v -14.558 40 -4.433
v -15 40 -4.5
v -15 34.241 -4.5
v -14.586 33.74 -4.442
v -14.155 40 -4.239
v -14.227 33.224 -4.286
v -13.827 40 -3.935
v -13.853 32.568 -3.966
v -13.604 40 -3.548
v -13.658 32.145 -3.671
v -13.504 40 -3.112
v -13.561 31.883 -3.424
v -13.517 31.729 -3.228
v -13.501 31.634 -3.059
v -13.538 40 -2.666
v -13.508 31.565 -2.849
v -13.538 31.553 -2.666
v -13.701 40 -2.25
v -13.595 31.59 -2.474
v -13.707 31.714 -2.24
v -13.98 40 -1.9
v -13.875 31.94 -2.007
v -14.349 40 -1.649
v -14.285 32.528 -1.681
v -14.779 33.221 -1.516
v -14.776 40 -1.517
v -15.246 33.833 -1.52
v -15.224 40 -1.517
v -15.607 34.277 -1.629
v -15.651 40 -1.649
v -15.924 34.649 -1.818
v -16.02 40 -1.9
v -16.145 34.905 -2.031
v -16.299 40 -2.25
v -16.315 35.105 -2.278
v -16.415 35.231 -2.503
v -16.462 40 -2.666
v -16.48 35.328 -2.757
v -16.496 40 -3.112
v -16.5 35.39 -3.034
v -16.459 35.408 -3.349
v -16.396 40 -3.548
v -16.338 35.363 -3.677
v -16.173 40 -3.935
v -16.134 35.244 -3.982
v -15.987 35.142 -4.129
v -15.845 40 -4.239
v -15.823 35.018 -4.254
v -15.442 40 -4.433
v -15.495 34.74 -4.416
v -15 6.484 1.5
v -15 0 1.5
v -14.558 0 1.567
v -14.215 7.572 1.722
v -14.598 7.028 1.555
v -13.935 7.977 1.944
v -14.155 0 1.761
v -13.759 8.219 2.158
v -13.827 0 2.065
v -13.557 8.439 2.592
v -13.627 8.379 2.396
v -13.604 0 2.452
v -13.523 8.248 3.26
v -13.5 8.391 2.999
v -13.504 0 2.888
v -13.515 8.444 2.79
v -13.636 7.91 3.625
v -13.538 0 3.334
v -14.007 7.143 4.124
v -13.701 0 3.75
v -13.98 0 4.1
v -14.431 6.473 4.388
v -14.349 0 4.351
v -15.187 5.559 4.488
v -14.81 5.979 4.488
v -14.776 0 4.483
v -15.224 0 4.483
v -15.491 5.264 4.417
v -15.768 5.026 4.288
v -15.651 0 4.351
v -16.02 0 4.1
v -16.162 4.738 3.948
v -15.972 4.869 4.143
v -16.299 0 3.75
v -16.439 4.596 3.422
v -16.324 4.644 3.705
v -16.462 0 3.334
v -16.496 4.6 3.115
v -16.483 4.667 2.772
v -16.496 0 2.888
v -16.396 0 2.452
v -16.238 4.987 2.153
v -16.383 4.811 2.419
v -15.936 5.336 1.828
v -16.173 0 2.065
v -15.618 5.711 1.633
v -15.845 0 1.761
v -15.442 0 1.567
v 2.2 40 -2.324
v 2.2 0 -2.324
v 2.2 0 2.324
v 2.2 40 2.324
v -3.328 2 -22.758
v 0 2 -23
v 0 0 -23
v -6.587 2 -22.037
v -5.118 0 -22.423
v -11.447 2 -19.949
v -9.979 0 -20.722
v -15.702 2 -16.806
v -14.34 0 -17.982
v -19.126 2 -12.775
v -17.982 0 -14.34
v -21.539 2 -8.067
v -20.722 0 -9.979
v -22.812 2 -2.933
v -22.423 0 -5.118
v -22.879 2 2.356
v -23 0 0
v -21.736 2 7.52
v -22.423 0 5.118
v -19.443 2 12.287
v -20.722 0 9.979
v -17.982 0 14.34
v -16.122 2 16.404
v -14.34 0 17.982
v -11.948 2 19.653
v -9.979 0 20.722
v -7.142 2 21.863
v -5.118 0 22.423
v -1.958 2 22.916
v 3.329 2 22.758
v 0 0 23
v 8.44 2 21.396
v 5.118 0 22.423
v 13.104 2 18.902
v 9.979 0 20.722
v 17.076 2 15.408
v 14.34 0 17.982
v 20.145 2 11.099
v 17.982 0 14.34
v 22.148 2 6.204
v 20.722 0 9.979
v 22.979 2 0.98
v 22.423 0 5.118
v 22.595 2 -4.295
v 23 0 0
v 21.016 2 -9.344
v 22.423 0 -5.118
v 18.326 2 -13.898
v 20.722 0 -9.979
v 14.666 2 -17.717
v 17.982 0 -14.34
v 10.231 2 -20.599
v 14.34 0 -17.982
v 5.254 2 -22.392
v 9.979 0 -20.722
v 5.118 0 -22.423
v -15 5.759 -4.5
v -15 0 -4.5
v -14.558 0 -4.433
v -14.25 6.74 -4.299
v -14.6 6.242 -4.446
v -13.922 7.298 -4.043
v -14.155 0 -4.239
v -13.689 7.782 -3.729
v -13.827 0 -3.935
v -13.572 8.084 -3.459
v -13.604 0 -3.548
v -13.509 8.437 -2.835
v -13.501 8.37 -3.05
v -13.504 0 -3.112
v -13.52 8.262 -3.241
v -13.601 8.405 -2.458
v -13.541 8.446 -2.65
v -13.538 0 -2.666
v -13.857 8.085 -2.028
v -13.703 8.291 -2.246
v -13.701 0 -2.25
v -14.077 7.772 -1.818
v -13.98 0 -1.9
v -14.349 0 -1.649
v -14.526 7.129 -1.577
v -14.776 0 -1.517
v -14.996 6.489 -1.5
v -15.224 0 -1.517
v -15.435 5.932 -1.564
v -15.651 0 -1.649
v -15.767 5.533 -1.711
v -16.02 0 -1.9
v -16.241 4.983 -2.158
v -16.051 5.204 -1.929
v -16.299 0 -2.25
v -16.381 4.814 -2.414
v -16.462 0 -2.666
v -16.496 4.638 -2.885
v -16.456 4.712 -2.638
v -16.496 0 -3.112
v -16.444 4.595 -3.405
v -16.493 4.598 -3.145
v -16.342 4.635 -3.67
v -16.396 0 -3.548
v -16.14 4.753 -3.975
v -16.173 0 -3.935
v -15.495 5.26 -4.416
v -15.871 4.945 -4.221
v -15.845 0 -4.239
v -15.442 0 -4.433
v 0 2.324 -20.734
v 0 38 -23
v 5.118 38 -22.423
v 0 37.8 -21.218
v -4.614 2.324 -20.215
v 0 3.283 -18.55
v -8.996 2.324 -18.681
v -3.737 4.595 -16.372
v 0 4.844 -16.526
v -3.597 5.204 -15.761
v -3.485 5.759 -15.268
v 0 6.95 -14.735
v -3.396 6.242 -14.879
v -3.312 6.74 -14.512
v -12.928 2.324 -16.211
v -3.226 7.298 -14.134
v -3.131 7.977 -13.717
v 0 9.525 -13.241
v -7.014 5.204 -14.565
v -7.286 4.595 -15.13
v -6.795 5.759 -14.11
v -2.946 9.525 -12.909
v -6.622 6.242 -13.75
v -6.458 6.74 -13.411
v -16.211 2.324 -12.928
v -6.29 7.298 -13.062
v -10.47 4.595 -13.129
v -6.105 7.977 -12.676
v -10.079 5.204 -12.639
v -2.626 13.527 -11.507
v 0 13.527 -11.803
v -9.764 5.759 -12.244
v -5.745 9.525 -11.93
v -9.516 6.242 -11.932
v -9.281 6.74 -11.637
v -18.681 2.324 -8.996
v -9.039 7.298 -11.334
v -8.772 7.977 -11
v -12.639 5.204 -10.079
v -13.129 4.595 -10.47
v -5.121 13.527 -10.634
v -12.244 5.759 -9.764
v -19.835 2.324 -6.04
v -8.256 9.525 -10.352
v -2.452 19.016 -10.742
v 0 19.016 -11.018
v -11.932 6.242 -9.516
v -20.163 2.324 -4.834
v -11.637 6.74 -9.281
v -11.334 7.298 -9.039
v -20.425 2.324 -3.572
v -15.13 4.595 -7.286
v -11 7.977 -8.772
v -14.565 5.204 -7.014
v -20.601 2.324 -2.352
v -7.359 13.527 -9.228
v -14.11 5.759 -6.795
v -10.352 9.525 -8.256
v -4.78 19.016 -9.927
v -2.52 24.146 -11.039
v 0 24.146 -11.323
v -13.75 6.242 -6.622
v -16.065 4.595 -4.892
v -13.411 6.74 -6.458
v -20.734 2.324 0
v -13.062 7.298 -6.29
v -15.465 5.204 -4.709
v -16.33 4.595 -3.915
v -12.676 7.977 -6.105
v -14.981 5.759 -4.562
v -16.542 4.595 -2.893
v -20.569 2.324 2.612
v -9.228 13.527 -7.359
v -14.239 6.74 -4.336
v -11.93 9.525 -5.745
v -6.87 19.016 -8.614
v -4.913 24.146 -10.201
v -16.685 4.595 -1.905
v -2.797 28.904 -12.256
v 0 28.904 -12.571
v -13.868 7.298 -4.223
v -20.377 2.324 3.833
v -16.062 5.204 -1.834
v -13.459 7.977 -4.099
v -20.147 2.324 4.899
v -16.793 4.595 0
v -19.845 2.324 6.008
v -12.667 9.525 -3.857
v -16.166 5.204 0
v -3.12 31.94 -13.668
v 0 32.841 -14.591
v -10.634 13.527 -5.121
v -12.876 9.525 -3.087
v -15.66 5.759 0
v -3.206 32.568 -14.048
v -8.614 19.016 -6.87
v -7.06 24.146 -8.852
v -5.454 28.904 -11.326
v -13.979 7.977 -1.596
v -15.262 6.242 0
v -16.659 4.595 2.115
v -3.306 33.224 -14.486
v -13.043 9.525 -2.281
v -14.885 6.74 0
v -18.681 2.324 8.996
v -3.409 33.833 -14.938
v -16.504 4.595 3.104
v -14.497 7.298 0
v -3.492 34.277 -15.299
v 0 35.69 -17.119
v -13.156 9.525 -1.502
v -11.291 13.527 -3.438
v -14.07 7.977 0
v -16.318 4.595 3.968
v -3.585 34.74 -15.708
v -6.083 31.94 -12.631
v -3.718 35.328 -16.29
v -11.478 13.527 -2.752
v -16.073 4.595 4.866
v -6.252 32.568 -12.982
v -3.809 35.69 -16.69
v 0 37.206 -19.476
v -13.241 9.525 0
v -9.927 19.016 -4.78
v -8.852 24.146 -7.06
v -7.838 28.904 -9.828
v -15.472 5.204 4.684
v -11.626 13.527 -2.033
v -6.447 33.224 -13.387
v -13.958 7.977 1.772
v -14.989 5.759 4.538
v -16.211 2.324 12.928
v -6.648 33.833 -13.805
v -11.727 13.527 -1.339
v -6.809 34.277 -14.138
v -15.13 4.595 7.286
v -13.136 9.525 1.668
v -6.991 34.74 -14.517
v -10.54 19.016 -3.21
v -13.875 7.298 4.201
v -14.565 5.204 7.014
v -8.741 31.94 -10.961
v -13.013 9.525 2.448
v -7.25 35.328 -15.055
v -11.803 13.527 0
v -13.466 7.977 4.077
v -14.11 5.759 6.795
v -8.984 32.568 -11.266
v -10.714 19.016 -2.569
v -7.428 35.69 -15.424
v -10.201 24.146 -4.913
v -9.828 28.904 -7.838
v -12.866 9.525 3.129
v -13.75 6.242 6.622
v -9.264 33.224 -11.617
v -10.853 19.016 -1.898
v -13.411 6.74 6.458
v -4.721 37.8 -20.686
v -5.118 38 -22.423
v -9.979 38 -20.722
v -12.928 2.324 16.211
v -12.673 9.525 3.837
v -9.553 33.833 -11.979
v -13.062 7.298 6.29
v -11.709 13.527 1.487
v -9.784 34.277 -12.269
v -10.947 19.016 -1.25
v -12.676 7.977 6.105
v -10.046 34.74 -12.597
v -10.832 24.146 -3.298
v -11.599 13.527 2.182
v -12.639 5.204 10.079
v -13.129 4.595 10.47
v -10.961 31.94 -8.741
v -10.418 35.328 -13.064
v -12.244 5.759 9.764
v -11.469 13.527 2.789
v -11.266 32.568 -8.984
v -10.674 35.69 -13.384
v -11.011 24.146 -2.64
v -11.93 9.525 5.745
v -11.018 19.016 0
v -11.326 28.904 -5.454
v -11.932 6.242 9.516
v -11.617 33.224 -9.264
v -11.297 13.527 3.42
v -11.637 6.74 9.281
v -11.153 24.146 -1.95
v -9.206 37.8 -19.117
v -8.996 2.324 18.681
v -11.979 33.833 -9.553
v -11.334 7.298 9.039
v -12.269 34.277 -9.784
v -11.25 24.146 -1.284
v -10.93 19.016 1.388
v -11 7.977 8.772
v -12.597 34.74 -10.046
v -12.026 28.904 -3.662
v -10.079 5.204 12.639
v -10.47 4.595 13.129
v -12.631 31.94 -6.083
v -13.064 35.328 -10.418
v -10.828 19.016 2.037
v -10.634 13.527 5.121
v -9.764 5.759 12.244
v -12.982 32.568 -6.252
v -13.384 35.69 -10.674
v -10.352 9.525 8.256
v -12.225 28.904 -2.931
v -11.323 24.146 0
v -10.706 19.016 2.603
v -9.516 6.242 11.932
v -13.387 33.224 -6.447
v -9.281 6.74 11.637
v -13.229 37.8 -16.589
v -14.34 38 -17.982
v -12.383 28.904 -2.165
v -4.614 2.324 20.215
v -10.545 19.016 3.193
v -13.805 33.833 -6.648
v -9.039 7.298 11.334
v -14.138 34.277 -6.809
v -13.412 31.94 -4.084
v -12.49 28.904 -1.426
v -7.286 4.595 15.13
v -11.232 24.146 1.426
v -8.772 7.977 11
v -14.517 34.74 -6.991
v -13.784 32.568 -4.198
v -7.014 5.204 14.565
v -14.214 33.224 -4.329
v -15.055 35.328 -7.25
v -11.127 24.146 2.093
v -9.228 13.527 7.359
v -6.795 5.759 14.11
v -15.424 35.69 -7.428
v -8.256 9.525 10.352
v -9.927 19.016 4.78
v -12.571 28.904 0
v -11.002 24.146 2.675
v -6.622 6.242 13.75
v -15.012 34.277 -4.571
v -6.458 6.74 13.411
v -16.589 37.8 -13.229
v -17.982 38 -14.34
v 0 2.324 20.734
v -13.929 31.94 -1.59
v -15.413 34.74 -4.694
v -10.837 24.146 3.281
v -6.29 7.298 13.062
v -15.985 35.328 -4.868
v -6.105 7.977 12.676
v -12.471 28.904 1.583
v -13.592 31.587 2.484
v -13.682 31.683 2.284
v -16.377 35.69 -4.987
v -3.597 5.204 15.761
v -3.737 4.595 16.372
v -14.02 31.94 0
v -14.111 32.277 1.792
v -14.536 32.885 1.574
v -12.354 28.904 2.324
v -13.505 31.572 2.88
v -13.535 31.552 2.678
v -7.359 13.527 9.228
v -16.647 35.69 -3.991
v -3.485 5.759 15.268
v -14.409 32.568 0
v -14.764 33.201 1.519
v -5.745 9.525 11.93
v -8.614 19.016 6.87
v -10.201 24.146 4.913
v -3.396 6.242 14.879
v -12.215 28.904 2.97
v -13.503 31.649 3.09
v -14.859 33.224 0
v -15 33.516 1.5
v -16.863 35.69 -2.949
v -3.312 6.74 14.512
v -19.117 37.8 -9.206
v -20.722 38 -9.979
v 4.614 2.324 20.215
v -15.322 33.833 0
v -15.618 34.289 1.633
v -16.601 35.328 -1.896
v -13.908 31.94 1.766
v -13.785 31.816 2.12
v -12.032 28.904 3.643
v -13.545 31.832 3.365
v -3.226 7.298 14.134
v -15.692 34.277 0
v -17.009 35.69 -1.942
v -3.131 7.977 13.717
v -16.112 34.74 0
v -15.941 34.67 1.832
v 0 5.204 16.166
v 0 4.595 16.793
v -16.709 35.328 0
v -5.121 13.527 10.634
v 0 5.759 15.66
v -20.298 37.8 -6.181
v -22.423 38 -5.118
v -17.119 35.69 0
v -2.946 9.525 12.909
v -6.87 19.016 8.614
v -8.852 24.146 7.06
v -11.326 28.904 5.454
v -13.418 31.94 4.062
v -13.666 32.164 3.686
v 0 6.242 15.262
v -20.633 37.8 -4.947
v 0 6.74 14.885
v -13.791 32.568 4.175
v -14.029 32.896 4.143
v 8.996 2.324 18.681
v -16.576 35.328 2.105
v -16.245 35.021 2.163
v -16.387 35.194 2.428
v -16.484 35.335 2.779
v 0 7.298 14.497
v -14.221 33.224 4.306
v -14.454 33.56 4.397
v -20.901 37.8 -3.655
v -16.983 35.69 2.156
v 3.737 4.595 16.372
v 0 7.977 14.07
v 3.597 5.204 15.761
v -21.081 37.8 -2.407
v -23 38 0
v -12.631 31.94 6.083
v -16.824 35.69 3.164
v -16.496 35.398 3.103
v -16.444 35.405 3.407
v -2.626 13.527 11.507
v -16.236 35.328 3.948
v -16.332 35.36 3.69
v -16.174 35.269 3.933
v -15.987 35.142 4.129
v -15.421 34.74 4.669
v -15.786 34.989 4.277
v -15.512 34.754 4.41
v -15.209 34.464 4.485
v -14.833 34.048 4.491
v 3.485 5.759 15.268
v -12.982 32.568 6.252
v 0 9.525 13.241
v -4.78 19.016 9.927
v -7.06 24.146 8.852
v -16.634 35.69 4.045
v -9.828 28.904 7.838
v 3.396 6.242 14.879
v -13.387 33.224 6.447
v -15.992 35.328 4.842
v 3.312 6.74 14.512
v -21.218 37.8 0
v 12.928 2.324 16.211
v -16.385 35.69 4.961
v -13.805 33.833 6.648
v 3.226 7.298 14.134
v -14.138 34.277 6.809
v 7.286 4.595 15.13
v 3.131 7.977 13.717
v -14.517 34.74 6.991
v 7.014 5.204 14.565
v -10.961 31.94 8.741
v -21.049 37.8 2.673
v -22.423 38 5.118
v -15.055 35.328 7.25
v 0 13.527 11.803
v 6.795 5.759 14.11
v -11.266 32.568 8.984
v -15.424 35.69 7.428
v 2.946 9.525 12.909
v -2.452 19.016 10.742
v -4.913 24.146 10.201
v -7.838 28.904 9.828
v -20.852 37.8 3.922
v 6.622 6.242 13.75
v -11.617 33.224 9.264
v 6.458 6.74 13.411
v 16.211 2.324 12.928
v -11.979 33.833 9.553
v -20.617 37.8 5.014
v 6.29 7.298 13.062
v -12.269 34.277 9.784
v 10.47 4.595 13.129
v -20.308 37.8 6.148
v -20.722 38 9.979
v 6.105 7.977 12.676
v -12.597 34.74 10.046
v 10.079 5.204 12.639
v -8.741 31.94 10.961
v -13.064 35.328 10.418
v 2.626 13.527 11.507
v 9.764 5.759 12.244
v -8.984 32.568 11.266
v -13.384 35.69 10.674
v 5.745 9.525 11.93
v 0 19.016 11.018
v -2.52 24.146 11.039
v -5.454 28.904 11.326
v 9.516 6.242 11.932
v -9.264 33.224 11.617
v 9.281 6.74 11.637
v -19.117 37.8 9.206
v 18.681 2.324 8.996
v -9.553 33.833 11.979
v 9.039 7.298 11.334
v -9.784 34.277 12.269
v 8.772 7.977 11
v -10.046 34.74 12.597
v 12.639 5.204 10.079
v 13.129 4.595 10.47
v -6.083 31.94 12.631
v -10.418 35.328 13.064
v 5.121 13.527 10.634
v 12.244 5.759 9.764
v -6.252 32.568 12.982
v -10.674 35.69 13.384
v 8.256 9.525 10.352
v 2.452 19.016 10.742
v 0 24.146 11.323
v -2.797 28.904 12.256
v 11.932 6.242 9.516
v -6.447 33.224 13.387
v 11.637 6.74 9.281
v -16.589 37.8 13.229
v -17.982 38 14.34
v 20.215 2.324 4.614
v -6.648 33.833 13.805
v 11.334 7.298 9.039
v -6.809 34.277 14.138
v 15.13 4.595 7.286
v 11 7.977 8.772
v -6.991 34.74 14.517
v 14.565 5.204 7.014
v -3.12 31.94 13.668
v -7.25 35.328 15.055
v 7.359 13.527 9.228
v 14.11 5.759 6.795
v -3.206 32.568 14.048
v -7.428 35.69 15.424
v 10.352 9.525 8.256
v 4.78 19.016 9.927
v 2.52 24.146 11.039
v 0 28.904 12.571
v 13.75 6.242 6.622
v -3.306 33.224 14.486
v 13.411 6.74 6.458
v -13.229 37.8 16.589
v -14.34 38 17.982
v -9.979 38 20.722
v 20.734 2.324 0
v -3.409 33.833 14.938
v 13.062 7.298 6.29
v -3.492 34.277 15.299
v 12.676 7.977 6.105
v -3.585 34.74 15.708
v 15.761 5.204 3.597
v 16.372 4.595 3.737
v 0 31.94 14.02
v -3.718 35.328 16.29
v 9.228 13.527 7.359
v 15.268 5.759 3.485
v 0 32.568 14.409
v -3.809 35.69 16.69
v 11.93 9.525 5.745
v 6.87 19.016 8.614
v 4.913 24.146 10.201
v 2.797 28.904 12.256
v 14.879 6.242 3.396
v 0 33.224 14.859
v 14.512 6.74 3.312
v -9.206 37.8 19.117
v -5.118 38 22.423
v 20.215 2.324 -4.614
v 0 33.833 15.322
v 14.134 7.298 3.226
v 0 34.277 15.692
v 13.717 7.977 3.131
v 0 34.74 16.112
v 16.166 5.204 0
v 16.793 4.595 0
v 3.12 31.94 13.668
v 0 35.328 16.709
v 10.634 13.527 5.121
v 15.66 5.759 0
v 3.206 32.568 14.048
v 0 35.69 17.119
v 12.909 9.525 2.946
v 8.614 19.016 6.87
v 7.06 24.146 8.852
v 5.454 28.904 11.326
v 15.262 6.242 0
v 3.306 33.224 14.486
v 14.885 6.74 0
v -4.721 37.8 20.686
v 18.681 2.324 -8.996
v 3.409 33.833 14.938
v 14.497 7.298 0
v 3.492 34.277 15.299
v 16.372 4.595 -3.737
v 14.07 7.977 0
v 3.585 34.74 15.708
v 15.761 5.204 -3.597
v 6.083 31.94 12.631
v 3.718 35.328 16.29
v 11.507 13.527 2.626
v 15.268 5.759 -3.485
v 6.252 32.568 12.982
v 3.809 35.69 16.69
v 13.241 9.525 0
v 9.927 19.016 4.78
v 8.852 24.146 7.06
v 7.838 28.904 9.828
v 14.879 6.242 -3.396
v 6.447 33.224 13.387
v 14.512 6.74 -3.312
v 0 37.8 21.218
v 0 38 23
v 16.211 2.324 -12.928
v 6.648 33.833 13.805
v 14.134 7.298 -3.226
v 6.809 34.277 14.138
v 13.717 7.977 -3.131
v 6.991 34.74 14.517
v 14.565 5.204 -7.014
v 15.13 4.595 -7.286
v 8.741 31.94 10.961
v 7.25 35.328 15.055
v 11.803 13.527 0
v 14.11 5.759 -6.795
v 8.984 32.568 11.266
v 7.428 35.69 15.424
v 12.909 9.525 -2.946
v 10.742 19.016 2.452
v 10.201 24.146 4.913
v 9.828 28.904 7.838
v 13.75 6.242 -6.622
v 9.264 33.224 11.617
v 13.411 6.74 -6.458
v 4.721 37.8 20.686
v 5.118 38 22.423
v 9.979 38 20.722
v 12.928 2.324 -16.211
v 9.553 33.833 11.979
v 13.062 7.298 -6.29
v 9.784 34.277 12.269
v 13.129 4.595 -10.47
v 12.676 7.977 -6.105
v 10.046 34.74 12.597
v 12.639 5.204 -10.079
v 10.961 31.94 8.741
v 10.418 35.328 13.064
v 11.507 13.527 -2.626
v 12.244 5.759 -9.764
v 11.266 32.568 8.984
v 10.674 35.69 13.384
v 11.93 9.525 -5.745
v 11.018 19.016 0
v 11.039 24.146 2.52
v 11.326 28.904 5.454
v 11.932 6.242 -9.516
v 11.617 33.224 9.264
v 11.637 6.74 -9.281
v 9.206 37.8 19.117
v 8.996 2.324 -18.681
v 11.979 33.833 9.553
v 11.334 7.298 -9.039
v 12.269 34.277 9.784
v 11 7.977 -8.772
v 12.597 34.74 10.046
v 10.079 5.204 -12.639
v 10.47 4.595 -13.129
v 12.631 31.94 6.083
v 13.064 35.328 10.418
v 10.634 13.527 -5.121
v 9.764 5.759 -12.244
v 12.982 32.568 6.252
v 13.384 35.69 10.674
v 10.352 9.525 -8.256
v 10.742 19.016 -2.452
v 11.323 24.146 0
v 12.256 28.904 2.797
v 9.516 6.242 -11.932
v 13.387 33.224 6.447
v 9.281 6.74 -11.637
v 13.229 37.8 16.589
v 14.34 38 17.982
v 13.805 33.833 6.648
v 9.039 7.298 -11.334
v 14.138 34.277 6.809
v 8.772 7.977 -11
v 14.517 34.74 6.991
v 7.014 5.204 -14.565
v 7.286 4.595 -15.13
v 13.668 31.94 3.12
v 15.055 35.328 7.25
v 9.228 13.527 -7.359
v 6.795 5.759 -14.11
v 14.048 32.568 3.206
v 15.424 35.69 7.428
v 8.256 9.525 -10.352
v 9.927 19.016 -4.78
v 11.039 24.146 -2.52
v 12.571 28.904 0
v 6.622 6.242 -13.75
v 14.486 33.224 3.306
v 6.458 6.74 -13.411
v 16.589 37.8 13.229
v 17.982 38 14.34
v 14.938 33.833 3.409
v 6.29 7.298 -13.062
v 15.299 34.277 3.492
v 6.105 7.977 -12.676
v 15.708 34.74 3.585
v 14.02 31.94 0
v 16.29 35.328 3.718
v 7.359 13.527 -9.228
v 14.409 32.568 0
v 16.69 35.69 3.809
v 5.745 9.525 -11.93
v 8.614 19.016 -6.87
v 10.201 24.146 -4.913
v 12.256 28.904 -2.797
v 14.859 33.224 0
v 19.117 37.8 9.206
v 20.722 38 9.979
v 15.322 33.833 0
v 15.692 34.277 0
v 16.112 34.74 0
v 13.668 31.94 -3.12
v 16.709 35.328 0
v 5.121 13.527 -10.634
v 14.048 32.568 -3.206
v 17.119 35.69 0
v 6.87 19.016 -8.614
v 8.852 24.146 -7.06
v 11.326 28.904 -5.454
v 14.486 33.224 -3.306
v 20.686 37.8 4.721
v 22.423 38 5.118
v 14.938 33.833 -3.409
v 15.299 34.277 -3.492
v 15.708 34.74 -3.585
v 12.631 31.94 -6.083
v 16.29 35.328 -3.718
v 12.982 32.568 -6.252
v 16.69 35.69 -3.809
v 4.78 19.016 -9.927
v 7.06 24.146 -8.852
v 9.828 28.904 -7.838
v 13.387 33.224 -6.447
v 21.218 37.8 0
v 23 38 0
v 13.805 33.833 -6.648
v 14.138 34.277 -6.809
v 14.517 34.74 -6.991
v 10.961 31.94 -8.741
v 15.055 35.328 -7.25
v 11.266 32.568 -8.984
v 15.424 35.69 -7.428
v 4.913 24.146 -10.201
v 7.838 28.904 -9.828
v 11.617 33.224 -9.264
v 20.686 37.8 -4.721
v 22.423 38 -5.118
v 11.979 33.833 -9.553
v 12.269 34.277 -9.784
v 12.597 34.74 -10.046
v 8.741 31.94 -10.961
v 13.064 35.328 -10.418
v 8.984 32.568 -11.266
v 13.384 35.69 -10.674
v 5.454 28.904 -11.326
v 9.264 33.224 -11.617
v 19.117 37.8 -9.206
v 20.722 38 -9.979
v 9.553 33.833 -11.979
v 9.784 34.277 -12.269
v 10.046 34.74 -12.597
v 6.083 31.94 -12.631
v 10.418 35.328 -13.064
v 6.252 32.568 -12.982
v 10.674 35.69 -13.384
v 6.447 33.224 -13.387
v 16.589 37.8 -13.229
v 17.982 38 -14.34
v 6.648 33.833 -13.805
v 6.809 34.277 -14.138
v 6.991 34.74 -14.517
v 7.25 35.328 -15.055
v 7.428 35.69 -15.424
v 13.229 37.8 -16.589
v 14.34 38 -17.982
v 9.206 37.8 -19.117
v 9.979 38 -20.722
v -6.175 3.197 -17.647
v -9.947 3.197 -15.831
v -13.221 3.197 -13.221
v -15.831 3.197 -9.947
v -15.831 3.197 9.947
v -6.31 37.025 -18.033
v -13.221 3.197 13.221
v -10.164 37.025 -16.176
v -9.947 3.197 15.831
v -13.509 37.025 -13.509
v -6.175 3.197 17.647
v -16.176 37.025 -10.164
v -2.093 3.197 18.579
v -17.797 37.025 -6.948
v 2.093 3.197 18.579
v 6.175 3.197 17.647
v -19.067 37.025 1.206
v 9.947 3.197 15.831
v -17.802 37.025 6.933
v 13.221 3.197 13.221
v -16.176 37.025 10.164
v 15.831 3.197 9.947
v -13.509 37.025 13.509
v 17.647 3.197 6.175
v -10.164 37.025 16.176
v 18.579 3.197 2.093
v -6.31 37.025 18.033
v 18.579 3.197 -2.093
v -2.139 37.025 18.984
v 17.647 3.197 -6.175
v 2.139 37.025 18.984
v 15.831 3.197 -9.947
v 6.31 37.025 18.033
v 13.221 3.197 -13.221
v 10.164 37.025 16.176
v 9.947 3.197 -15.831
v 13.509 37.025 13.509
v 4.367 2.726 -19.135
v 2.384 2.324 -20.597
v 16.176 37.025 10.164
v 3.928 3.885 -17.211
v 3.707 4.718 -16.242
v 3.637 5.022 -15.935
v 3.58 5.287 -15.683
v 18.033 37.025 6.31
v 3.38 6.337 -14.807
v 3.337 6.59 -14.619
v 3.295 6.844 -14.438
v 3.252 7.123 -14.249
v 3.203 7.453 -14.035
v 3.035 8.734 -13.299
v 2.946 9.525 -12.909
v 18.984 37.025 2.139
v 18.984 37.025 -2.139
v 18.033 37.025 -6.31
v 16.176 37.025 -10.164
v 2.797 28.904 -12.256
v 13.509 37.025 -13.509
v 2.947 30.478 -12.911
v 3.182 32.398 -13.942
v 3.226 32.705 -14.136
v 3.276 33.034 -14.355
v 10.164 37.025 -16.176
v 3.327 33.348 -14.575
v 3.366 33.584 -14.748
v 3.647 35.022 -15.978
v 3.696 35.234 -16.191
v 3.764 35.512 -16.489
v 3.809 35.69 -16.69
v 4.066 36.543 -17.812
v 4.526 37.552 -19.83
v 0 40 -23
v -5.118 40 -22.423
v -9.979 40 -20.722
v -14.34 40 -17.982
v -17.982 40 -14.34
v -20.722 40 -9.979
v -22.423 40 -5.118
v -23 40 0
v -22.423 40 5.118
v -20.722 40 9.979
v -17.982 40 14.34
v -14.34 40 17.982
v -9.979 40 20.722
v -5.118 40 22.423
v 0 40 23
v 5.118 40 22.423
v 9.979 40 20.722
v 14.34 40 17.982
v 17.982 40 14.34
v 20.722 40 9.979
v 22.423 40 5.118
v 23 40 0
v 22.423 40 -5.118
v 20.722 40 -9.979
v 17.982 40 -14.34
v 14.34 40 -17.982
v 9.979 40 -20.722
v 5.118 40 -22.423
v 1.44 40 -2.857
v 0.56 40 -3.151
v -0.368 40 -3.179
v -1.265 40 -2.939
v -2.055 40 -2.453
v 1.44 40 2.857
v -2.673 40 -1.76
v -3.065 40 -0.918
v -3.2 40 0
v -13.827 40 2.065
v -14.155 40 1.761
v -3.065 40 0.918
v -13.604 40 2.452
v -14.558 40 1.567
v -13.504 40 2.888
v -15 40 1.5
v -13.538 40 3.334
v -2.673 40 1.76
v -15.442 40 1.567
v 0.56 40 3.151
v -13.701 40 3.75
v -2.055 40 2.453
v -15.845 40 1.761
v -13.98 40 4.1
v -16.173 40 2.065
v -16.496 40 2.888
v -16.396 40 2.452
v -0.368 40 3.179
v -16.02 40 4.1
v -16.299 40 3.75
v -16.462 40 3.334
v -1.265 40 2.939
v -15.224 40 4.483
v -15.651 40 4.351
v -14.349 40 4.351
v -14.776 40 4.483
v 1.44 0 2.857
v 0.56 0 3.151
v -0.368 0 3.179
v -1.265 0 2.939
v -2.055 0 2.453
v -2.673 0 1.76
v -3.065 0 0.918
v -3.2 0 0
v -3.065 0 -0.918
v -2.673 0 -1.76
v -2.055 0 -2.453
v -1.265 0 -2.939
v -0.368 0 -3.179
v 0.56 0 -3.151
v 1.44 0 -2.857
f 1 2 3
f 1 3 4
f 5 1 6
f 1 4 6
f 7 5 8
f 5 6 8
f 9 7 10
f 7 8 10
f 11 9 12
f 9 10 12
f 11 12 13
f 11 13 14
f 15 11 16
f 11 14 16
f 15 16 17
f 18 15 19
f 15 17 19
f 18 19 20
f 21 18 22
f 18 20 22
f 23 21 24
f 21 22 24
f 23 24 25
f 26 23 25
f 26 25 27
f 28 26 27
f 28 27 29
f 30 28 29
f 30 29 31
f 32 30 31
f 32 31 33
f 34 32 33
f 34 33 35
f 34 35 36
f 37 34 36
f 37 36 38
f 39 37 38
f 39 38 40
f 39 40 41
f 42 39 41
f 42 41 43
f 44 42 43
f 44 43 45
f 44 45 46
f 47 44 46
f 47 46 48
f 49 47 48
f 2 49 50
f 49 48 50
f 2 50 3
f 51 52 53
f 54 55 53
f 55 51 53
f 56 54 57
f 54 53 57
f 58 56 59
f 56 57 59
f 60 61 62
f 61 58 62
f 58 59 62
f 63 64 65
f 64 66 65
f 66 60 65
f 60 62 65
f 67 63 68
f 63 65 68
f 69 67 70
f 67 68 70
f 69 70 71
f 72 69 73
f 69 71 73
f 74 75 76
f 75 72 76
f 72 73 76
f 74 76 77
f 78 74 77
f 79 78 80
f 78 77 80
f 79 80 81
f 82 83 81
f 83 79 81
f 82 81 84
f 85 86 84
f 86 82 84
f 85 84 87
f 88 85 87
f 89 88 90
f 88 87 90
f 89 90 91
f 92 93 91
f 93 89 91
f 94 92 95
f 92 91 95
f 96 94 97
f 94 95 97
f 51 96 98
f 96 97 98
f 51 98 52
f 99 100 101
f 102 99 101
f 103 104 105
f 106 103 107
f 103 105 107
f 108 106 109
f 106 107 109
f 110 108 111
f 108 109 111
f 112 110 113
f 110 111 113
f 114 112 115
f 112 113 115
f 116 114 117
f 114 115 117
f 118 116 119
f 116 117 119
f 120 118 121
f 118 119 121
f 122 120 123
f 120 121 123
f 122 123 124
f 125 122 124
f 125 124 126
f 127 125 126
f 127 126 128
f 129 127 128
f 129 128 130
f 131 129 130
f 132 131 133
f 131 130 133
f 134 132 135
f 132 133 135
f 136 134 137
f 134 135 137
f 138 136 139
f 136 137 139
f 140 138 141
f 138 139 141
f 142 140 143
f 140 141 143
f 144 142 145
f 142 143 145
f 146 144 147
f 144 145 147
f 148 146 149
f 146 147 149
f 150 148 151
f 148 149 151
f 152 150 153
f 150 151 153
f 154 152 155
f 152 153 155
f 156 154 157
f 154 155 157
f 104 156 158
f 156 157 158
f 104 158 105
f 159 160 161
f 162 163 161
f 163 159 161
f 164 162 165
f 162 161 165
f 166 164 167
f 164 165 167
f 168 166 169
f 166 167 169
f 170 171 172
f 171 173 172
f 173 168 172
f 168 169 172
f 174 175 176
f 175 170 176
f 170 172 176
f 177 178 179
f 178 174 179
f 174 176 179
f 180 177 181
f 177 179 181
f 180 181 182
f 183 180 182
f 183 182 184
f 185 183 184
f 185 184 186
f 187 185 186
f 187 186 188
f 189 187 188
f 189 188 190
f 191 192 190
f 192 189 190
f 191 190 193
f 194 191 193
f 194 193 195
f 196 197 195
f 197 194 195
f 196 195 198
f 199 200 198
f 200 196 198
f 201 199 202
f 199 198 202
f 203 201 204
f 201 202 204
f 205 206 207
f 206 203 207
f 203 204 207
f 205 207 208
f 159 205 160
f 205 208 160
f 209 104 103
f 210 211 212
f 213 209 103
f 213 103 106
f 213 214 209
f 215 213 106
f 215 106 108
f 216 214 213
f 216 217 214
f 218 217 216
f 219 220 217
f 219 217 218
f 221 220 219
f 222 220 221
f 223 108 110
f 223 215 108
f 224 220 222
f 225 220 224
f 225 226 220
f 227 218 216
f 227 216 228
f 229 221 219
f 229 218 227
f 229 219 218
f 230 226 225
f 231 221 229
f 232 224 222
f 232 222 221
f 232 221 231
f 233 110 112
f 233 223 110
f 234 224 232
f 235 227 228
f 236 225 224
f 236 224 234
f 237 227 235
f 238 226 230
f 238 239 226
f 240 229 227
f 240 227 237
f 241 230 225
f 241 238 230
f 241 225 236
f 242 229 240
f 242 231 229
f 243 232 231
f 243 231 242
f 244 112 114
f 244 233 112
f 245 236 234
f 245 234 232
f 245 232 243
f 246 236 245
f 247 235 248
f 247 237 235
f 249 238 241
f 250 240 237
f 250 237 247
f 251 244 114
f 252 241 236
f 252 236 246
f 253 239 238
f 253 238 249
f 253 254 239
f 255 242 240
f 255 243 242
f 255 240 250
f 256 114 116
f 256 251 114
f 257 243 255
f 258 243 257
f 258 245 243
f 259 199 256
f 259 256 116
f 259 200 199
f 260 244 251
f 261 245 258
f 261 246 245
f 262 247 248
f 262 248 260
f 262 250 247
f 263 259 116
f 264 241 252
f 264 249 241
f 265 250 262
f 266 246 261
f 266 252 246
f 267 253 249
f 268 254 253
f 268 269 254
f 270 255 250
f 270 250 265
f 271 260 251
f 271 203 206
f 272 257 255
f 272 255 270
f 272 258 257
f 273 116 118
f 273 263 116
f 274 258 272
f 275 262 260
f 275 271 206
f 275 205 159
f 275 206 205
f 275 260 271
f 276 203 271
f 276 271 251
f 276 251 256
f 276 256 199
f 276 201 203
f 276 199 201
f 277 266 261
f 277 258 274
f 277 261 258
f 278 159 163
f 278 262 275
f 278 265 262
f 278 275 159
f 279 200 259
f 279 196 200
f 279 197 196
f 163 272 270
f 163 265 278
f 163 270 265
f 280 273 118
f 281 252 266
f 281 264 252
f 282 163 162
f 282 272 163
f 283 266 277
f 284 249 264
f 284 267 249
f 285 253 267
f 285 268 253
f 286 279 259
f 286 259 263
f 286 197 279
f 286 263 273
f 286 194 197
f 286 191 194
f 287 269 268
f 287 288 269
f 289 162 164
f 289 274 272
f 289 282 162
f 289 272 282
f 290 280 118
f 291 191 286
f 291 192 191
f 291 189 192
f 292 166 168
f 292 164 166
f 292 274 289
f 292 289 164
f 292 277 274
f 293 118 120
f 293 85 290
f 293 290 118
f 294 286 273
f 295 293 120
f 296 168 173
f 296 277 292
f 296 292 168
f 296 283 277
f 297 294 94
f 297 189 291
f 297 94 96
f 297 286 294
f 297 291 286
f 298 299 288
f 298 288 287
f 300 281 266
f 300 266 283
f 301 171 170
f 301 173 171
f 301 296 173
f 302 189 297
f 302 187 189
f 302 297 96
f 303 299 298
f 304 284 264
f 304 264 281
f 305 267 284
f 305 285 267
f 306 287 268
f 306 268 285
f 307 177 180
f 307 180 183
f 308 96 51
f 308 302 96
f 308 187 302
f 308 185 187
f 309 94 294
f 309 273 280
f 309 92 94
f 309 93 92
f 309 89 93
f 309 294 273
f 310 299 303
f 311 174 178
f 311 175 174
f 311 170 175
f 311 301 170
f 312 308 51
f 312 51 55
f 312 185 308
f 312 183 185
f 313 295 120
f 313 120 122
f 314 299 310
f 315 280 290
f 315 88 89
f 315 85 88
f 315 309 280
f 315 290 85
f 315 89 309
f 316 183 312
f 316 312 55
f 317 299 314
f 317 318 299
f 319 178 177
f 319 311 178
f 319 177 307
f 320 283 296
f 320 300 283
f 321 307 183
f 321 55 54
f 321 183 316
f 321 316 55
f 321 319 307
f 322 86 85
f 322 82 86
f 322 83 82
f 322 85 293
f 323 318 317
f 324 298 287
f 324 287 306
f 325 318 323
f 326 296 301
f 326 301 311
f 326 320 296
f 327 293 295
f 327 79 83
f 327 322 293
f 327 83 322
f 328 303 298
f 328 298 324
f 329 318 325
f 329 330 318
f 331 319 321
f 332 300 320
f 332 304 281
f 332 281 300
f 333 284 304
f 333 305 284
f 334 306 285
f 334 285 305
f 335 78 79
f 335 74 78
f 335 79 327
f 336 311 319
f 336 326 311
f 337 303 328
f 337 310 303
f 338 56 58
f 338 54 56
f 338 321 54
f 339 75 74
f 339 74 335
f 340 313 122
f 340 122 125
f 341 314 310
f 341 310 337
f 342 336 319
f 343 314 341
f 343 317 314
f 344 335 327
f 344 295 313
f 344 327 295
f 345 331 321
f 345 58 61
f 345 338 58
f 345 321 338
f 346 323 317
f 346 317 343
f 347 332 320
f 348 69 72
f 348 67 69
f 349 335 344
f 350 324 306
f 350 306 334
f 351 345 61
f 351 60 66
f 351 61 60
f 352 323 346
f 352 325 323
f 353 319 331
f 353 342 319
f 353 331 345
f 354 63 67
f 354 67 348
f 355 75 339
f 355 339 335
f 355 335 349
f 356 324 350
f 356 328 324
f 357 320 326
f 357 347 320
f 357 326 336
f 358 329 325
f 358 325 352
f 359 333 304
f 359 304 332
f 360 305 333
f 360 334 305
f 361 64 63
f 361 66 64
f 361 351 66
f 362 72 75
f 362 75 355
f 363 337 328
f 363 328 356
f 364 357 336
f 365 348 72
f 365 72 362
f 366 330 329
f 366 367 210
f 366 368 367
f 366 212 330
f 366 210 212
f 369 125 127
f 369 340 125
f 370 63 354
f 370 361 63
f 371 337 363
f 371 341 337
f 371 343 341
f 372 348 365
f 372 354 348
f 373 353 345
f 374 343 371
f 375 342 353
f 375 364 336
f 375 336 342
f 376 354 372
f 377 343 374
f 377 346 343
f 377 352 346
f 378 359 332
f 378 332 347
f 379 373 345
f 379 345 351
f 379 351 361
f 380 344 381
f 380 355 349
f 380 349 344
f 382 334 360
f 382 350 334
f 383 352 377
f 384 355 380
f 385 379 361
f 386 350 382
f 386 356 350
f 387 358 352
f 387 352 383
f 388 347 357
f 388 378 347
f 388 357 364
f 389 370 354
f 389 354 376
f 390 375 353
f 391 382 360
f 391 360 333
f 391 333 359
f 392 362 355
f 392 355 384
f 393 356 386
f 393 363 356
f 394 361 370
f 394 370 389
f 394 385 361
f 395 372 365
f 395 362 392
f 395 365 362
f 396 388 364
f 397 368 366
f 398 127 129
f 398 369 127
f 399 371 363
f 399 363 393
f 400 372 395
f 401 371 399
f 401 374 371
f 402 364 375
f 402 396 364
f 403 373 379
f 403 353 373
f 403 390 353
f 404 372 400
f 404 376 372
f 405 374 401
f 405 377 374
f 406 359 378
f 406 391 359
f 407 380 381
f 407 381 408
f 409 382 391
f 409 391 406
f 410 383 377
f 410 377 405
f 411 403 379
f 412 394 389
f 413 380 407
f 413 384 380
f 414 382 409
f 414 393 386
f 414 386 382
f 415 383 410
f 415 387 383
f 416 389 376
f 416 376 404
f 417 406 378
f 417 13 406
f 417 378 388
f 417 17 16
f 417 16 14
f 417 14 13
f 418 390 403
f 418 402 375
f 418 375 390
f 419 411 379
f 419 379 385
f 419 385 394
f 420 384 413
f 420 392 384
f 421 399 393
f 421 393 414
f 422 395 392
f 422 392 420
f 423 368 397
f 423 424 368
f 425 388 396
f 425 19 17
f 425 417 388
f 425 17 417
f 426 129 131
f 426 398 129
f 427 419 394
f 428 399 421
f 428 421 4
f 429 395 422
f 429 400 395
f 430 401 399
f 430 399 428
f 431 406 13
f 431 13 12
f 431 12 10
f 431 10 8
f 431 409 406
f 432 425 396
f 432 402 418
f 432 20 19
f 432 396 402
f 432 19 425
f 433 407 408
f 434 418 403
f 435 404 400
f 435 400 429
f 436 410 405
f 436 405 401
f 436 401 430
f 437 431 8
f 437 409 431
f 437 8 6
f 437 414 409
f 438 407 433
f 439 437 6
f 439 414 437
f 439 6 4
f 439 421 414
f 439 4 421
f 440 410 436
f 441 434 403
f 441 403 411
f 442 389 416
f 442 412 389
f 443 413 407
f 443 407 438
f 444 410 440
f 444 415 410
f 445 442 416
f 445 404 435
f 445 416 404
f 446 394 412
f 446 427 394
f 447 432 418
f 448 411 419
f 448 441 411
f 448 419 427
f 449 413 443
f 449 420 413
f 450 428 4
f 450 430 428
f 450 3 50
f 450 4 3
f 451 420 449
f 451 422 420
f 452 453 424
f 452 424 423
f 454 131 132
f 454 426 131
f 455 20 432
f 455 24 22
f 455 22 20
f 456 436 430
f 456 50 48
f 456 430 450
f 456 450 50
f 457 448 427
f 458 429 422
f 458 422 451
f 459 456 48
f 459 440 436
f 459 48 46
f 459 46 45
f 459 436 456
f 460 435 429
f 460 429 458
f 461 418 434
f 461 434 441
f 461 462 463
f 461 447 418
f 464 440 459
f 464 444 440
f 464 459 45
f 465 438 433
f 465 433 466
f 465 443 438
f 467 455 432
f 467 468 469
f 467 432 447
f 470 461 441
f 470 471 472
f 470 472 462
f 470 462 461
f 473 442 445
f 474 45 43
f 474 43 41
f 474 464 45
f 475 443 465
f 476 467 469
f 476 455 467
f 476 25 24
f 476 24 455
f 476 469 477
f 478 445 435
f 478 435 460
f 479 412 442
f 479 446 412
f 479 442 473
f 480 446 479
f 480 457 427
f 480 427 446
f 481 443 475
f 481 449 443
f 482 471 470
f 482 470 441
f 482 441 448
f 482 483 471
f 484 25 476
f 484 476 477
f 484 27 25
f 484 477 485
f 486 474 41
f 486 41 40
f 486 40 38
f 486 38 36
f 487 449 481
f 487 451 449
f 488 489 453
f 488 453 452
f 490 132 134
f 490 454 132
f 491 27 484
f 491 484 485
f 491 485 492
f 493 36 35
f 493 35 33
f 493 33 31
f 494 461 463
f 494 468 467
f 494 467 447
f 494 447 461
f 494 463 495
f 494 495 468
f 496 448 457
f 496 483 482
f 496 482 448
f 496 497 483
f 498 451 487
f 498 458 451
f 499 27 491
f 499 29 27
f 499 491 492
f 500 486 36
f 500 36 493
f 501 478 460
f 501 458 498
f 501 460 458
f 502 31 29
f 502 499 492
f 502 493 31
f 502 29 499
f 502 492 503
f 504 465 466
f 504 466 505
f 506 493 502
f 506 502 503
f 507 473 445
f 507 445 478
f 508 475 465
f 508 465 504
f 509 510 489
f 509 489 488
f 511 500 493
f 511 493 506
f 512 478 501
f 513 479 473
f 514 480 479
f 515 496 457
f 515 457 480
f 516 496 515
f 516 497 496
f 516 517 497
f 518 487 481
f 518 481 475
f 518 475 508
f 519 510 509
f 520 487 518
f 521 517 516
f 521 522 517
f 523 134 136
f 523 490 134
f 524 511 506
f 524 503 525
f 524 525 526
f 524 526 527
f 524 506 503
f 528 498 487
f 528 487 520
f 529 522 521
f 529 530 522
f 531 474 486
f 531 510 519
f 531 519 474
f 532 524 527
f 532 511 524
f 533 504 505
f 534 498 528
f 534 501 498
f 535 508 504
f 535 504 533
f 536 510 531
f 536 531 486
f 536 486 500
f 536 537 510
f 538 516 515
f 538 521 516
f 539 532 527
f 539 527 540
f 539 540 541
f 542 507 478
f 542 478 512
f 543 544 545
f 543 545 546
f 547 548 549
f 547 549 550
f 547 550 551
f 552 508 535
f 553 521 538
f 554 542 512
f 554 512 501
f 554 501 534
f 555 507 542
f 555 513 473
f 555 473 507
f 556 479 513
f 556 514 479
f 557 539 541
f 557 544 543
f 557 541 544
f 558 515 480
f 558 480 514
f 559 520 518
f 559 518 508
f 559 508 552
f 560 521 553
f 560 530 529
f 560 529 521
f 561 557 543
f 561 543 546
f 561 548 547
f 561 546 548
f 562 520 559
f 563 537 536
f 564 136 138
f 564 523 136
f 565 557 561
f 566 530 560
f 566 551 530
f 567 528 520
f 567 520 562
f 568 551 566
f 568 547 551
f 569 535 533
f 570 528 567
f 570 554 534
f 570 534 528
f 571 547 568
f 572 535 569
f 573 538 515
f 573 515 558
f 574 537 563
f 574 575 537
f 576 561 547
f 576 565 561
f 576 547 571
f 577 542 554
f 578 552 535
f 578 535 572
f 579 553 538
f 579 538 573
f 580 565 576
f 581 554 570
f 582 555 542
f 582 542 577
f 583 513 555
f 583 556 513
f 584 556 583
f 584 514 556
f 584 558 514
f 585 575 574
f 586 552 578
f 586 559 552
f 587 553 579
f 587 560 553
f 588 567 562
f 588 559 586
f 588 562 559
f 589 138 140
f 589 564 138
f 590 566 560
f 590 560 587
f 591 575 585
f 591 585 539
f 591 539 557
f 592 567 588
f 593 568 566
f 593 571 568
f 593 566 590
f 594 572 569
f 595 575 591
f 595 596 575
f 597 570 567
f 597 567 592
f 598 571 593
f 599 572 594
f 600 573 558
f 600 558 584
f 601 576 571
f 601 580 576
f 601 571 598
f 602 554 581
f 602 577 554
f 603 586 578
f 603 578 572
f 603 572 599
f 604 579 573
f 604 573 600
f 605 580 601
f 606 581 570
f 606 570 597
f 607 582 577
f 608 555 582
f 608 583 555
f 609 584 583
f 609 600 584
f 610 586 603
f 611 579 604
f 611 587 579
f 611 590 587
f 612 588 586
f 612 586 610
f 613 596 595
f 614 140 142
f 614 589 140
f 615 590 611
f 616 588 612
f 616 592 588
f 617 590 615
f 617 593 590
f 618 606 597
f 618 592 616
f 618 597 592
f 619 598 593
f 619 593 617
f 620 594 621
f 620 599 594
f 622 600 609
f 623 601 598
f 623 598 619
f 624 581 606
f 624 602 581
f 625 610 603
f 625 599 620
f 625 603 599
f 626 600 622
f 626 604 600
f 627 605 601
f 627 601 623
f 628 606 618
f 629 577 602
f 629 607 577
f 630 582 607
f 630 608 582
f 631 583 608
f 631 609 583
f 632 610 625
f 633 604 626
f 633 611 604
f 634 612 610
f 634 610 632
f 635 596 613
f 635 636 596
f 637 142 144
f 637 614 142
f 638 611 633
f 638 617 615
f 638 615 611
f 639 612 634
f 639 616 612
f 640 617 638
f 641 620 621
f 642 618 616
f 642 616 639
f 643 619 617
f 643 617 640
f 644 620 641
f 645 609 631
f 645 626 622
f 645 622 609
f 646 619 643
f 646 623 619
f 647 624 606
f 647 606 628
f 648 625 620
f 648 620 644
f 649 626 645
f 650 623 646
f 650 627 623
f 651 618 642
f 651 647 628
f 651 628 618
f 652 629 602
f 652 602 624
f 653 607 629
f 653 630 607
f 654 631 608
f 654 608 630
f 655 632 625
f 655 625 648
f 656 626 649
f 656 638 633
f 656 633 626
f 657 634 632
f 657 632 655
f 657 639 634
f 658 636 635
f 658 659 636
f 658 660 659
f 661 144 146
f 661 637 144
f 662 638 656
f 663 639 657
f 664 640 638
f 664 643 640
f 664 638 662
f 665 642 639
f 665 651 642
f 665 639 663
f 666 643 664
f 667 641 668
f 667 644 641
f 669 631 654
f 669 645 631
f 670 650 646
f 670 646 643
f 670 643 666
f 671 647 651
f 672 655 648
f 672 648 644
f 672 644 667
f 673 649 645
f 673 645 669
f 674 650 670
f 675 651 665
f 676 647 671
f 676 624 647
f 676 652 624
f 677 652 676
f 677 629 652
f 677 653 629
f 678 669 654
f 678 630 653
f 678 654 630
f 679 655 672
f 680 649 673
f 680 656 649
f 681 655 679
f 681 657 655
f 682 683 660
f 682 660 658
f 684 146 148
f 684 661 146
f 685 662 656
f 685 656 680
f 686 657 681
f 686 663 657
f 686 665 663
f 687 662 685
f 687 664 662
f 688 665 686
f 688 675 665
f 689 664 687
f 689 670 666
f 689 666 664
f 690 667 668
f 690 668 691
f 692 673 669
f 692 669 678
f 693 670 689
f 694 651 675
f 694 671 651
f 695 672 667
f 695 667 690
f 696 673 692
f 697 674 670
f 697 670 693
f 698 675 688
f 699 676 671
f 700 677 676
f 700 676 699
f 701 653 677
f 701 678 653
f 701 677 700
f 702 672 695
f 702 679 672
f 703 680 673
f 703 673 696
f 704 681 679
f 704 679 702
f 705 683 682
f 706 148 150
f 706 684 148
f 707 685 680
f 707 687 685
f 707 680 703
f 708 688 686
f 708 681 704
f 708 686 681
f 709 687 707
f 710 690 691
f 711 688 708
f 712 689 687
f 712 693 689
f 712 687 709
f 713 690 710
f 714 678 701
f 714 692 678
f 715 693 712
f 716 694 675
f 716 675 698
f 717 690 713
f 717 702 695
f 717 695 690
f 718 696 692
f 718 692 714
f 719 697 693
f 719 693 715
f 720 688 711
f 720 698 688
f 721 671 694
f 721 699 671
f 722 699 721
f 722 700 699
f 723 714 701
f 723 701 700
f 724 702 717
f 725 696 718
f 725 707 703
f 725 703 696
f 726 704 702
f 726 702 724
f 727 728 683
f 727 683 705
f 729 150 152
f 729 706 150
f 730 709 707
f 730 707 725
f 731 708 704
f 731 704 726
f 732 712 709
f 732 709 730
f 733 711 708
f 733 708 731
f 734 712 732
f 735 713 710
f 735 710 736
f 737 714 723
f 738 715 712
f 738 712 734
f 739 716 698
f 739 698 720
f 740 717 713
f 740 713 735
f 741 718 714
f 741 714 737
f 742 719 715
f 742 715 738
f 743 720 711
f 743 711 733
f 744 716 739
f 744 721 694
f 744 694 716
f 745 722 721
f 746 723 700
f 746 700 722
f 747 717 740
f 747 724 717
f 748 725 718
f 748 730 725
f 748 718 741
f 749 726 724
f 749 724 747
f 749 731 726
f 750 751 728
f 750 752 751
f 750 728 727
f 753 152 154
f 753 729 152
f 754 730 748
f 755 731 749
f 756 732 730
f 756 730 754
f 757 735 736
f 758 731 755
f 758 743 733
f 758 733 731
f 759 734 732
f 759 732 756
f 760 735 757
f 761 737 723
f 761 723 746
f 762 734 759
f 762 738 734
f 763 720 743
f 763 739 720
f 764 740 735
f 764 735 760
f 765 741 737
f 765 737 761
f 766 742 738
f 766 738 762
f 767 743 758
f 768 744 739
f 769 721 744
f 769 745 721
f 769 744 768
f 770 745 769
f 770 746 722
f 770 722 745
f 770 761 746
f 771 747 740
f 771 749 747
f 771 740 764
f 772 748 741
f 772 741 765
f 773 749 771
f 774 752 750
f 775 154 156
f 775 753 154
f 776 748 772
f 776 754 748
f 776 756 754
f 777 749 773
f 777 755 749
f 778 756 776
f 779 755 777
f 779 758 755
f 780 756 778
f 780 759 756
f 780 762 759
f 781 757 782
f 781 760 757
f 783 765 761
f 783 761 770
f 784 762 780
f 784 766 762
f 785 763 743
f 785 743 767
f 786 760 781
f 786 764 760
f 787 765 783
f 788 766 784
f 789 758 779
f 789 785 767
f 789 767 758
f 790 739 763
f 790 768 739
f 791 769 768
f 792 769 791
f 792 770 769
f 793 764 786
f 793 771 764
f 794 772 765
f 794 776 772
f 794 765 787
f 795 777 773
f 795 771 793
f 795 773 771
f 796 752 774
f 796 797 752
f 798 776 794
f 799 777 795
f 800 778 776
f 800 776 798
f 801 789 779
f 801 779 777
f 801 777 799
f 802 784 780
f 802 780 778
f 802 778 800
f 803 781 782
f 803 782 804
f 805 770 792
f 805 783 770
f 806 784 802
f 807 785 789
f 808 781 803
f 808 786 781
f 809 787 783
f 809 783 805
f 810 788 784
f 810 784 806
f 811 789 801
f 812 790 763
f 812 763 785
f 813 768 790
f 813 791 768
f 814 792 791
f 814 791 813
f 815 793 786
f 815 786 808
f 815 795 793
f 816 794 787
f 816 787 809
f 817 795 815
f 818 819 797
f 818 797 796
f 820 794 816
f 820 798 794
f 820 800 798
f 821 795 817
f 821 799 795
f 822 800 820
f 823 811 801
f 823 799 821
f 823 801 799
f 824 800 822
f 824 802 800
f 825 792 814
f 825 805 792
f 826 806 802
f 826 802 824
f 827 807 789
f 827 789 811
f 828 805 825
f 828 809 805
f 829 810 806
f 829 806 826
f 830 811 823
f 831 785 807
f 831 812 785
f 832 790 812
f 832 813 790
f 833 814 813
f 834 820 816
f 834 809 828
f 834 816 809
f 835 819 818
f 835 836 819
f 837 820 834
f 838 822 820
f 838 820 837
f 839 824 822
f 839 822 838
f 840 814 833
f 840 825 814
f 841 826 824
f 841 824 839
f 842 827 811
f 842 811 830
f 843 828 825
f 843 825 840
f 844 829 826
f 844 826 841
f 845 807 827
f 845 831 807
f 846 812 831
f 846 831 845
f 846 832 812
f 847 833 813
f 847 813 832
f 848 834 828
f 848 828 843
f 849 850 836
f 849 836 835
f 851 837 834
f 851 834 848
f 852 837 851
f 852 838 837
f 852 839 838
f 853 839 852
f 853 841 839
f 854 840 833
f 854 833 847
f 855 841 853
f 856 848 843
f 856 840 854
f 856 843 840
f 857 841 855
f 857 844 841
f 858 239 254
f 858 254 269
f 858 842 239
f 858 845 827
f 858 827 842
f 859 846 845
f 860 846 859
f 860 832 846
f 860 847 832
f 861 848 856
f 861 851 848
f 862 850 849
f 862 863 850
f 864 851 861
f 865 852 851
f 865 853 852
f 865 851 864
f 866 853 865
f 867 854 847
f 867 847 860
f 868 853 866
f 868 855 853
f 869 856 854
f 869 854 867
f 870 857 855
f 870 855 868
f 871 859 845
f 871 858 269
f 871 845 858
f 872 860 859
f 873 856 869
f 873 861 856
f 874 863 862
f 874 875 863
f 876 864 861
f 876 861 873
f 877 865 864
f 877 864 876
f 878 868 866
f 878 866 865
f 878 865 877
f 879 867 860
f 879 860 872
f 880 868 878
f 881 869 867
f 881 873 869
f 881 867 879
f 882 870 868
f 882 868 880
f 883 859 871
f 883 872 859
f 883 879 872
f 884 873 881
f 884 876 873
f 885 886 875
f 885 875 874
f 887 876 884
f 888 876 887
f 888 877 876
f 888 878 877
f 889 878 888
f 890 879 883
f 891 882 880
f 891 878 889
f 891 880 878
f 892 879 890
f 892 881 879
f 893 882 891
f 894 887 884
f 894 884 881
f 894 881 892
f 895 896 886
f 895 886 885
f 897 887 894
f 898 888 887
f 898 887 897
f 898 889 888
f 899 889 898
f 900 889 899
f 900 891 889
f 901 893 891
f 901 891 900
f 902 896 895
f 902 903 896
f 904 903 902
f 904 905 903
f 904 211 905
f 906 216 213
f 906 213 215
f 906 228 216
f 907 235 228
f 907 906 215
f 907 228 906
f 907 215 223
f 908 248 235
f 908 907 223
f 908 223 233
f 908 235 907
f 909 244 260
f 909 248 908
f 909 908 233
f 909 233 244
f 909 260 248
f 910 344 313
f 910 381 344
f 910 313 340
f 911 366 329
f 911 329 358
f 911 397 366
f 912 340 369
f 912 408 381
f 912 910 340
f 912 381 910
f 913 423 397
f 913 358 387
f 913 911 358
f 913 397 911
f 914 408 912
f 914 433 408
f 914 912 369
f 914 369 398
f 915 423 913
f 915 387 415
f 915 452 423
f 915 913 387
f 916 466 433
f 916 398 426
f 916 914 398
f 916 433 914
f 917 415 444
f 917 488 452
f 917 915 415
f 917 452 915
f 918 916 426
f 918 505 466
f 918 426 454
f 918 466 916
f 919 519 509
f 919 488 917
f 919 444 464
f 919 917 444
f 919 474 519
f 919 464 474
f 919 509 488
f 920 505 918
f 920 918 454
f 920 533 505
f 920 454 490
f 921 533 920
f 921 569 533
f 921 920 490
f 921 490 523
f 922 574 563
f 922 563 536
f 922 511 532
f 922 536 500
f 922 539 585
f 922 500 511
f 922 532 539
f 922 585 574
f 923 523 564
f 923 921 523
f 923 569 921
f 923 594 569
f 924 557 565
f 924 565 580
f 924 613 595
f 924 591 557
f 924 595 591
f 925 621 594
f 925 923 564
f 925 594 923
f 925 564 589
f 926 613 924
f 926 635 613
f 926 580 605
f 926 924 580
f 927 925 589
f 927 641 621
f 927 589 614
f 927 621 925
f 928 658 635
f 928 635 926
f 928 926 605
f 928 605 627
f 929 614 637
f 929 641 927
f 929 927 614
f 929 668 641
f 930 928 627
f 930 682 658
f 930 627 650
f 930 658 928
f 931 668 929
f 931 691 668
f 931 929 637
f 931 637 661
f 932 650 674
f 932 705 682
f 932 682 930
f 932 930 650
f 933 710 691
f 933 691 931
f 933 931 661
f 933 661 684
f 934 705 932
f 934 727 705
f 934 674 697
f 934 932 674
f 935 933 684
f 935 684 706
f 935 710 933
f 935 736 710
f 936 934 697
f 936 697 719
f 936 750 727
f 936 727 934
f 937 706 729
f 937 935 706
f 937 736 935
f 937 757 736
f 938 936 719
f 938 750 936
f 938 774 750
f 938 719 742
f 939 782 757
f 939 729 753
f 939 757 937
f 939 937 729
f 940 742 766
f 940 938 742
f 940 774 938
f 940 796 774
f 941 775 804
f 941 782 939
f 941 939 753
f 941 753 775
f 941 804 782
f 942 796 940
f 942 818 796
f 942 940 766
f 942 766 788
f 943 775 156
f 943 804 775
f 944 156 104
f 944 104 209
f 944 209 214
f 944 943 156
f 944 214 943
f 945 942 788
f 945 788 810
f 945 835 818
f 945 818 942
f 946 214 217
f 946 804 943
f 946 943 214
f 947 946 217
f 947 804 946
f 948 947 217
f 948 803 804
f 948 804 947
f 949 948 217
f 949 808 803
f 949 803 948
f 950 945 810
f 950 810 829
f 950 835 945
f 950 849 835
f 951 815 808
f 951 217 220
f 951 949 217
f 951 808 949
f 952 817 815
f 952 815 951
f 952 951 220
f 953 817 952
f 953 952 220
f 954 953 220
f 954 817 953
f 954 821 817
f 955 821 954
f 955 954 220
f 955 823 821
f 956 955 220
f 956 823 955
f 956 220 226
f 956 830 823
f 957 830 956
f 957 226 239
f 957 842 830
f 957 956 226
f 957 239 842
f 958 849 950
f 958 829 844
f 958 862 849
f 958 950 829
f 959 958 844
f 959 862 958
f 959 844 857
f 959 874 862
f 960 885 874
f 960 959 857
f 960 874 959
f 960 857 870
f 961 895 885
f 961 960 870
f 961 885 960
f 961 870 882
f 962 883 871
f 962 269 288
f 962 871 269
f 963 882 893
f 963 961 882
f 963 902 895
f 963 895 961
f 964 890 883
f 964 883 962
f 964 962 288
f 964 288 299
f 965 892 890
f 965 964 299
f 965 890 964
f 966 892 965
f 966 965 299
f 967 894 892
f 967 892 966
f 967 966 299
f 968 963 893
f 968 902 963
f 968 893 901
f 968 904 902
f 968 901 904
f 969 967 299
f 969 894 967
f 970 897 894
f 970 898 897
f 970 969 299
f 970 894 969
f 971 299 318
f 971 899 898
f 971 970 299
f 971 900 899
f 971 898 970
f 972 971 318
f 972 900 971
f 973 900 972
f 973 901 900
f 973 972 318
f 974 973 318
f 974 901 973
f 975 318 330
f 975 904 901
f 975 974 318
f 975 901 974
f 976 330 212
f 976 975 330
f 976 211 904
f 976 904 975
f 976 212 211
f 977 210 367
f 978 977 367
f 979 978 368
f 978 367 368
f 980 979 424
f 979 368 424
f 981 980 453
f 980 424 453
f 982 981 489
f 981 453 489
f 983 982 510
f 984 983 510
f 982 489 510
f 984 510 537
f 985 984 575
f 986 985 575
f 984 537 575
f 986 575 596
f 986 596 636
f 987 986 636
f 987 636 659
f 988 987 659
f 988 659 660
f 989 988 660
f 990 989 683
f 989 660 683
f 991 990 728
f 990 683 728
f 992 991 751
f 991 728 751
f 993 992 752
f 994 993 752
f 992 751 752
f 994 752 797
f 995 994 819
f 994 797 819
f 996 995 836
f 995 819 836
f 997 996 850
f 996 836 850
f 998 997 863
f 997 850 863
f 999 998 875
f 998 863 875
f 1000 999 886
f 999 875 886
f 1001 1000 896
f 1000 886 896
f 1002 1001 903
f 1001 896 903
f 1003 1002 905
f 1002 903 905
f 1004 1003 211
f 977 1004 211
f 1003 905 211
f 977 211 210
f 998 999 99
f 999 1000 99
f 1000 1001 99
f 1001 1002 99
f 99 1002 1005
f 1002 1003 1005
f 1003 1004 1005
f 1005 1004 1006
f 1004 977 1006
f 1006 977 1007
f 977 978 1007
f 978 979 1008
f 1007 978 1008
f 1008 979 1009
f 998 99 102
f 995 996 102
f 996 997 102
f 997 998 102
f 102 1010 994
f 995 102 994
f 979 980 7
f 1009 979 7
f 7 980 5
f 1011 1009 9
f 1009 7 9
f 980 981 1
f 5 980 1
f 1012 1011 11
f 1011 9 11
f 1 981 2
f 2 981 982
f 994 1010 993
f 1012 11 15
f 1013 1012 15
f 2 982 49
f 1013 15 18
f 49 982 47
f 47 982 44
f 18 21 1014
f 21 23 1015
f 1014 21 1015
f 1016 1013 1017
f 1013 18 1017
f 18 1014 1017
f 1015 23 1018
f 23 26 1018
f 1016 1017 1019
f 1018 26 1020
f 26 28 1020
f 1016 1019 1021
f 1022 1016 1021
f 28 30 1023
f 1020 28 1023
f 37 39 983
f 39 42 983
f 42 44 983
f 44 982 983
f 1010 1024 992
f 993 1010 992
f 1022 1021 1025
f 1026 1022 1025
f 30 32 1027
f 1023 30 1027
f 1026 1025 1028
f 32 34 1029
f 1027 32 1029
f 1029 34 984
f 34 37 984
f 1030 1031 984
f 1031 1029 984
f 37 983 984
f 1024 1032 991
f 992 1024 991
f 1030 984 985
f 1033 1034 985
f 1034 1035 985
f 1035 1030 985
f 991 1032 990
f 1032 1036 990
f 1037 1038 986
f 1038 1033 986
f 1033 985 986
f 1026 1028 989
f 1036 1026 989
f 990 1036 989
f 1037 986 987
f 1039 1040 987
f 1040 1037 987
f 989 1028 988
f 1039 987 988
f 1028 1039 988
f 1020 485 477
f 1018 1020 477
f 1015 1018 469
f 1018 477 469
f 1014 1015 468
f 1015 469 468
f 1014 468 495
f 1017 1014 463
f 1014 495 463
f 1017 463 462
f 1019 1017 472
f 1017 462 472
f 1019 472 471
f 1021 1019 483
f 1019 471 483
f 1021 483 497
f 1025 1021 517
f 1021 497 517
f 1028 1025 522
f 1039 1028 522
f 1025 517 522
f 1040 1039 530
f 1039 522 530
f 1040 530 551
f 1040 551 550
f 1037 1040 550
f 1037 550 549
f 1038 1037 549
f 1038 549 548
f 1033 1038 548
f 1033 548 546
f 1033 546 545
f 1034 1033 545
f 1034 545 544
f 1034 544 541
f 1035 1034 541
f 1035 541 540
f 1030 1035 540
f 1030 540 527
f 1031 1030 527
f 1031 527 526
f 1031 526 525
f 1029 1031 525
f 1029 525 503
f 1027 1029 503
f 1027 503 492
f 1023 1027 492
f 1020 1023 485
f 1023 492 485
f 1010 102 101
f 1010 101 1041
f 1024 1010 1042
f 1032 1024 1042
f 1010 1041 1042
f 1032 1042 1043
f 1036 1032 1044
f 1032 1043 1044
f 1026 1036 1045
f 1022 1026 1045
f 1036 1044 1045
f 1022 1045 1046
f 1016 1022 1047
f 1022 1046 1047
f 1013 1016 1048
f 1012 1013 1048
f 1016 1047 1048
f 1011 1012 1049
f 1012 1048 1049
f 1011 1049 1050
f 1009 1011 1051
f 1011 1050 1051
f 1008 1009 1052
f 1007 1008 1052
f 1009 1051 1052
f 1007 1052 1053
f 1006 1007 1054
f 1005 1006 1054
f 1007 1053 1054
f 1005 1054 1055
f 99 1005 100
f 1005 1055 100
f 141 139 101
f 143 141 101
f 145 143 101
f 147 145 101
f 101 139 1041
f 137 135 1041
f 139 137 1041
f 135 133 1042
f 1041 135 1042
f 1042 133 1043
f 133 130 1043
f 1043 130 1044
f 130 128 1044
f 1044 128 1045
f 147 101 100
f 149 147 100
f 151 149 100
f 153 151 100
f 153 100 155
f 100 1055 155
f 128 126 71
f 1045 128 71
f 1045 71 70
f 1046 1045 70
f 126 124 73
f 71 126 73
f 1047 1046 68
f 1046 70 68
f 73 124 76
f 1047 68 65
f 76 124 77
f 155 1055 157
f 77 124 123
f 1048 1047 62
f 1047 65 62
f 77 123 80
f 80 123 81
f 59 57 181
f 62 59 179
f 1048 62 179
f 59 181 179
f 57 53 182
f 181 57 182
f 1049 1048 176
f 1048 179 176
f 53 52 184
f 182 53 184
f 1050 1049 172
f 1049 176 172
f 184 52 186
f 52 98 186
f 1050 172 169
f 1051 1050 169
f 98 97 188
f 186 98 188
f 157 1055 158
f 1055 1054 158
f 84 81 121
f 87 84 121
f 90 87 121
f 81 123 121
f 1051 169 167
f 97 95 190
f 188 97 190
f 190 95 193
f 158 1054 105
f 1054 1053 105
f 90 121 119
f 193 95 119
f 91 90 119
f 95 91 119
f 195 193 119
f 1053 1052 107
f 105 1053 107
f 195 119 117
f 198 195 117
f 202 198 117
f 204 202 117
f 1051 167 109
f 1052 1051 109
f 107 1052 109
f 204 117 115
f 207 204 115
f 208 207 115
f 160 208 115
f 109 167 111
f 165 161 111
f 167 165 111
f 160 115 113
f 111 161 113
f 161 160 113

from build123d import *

# Parameters (mm, degrees)
SKETCH8_RX         = 18
SKETCH8_RY         = 12
SKETCH1_R          = 1.5
CUT_EXTRUDE1_DEPTH = 52.555795108


with BuildPart() as part:
    # Sketch4 → Revolve1 (revolve)
    with BuildSketch(Plane.XY, mode=Mode.PRIVATE) as revolve1_sk:
        Polygon((-23, 0), (0, 0), (0, 40), (-23, 40), (-23, 35), (-23, 5), align=None)
    revolve(revolve1_sk.sketch.rotate(Axis((0, -1.5, 0), (0, 1, 0)), 270), axis=Axis((0, -1.5, 0), (0, 1, 0)))

    # Sketch8 → Cut-Revolve2 (revolve, cut)
    with BuildSketch(Plane.XY, mode=Mode.PRIVATE) as cut_revolve2_sk:
        with Locations(Location((-23, 20), (0, 0, 90))):
            Ellipse(SKETCH8_RX, SKETCH8_RY)
    revolve(cut_revolve2_sk.sketch.rotate(Axis((0, -1.5, 0), (0, 1, 0)), 270), axis=Axis((0, -1.5, 0), (0, 1, 0)), mode=Mode.SUBTRACT)

    # Sketch1 → Cut-Extrude1 (cut, through all)
    with BuildSketch(Plane(origin=(0, 0, 0), x_dir=(-1, 0, 0), z_dir=(0, -1, 0))):
        with Locations(Location((15, 3, 0), (0, 0, 90))):
            Circle(SKETCH1_R)
        with Locations(Location((15, -3, 0), (0, 0, 90))):
            Circle(SKETCH1_R)
        with BuildLine():
            Line((-2.2, 2.323790008), (-2.2, -2.323790008))
            ThreePointArc((-2.2, -2.323790008), (3.2, 0), (-2.2, 2.323790008))
        make_face()
    extrude(amount=-CUT_EXTRUDE1_DEPTH, mode=Mode.SUBTRACT)


solid = part.part
